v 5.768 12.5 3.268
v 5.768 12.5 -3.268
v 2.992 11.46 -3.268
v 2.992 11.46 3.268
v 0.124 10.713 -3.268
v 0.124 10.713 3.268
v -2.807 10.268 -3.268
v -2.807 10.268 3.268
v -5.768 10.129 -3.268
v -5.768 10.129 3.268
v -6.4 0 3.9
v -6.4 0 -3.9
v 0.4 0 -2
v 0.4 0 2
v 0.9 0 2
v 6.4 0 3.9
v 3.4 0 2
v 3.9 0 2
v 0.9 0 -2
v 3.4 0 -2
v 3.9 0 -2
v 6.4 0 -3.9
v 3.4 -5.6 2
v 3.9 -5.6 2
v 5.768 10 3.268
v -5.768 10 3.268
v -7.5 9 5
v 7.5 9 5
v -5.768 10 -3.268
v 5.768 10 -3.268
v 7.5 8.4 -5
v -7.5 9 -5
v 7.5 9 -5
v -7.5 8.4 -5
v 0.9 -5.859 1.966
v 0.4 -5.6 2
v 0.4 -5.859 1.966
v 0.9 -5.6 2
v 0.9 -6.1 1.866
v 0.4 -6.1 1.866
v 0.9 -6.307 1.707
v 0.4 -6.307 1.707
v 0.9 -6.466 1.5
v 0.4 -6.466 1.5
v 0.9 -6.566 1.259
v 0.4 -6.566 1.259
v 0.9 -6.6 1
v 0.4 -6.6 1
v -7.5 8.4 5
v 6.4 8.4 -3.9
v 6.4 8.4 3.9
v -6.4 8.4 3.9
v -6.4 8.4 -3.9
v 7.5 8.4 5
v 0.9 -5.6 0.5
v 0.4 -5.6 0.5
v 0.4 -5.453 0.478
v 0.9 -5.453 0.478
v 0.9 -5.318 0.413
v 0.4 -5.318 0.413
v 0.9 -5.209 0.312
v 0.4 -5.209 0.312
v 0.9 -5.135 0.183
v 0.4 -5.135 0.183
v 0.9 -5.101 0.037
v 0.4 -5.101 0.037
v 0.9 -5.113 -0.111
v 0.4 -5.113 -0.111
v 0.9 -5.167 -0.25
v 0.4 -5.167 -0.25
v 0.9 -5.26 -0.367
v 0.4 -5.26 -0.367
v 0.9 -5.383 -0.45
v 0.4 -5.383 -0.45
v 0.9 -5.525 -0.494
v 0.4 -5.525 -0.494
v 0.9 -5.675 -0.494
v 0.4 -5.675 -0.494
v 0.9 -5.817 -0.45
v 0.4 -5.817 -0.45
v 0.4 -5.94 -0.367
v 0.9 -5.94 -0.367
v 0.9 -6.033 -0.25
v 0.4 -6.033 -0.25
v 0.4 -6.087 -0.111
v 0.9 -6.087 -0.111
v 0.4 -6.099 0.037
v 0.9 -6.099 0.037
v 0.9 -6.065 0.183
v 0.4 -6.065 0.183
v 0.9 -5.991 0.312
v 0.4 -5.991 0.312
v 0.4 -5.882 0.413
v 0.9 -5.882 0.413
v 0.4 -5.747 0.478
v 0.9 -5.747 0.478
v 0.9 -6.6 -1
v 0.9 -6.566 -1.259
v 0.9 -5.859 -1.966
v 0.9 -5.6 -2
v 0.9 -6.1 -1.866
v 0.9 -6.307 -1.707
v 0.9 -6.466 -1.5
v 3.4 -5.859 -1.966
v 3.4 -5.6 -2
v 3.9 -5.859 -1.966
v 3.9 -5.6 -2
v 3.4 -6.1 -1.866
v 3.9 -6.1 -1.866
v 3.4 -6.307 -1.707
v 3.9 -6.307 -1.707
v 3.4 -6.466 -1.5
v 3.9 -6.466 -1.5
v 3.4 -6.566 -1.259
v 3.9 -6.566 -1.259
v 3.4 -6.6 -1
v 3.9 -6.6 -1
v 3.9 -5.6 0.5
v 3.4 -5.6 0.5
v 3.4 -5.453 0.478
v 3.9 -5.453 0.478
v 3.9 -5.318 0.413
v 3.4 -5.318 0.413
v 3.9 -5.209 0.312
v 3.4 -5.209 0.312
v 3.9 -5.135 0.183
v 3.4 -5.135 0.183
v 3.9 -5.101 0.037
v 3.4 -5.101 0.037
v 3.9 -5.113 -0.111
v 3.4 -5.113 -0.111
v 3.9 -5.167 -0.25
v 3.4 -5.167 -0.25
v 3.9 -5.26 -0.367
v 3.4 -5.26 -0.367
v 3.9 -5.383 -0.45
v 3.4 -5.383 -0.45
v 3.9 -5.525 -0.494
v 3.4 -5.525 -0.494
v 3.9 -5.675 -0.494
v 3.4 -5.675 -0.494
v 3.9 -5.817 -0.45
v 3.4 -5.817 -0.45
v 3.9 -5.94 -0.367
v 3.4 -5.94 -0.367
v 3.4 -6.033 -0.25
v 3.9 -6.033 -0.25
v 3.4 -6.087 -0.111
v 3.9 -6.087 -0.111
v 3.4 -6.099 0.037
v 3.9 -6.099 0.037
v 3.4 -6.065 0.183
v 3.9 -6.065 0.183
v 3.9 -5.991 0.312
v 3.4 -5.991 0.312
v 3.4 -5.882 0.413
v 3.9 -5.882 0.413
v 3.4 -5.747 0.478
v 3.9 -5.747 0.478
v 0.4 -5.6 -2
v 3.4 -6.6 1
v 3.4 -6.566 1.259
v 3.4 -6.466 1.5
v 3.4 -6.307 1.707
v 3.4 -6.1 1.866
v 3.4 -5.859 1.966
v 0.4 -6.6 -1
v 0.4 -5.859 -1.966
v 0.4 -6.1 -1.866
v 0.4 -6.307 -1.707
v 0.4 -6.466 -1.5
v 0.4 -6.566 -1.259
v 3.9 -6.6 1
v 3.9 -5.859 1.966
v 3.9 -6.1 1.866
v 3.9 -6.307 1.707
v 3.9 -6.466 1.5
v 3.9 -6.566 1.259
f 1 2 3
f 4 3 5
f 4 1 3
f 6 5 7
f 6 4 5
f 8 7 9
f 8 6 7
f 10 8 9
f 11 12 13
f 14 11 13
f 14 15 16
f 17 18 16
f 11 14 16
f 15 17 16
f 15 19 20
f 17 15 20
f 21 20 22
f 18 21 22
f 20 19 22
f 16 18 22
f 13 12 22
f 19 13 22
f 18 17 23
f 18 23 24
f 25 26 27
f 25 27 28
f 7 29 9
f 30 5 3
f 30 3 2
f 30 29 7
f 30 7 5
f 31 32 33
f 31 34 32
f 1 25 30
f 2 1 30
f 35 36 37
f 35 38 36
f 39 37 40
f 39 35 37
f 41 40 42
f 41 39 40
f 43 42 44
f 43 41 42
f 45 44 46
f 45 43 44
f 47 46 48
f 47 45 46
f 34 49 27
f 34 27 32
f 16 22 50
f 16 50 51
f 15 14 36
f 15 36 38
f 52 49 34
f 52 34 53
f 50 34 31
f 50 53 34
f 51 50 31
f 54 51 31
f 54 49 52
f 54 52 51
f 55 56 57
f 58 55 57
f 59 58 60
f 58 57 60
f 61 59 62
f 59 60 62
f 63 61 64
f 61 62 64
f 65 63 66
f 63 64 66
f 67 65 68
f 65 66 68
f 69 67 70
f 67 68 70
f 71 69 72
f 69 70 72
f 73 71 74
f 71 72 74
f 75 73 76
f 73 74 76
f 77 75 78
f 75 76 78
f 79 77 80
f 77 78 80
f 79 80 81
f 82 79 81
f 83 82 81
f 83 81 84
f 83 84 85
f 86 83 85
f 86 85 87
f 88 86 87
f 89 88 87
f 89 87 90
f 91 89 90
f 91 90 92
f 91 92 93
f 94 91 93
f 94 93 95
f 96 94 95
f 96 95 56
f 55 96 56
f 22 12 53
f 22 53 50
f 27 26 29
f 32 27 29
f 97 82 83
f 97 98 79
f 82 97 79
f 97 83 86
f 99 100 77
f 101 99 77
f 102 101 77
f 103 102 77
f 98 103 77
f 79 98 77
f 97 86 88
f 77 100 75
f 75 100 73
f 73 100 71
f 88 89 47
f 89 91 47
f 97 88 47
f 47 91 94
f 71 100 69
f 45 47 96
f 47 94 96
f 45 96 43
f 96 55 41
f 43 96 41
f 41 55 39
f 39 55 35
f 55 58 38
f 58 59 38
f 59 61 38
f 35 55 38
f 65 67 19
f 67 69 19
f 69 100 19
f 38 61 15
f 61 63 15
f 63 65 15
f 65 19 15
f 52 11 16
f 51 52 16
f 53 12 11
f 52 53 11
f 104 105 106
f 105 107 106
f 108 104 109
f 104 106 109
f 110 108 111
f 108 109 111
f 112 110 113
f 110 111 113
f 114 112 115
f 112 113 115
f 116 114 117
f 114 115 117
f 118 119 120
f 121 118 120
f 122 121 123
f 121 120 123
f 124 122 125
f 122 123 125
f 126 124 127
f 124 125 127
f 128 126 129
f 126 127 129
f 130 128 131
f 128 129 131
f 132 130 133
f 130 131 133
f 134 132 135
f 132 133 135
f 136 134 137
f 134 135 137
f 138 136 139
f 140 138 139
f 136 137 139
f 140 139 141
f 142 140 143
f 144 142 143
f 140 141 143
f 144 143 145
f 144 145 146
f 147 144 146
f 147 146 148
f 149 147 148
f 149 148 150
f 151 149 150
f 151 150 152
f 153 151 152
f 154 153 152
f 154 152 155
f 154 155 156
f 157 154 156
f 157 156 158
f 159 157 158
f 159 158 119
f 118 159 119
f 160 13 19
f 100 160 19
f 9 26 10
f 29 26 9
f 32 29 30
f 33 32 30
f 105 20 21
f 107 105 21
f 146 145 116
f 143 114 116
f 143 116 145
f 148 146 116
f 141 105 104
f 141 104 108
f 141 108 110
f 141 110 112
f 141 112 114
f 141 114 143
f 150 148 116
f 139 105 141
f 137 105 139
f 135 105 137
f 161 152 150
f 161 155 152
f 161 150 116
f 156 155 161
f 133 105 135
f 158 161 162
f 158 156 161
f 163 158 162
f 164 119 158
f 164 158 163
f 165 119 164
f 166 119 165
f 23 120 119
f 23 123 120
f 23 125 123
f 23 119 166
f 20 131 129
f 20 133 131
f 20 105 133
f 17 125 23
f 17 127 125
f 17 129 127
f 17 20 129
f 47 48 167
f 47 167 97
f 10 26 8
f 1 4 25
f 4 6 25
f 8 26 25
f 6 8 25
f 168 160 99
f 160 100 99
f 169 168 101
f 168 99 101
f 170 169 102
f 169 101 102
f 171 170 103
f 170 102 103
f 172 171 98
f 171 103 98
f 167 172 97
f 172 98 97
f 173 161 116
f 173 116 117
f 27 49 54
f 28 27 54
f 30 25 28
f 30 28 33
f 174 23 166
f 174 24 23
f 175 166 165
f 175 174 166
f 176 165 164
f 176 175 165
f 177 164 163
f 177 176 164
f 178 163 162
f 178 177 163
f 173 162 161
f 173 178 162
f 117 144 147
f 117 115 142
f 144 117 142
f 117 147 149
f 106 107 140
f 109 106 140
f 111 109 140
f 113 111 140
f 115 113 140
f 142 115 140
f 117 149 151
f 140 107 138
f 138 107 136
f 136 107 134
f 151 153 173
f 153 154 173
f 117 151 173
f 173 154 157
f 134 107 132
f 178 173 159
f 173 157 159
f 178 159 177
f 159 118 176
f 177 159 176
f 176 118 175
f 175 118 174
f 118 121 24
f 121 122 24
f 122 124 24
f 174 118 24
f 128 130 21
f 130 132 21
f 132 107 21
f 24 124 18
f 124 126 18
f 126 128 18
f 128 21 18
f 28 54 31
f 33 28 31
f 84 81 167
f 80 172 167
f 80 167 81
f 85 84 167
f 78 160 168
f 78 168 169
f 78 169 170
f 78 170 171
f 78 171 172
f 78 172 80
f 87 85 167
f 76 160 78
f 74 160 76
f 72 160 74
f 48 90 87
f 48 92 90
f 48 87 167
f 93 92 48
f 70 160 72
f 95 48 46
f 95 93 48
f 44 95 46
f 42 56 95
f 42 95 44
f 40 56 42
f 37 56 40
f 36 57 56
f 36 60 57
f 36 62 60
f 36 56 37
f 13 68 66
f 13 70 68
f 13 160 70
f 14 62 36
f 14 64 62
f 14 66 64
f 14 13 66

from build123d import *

# Parameters (mm, degrees)
SKETCH1_W               = 15
SKETCH1_H               = 10
BOSS_EXTRUDE1_DEPTH     = 10
SKETCH2_W               = 15
SKETCH2_H               = 10
SKETCH2_W_2             = 12.8
SKETCH2_H_2             = 7.8
CUT_EXTRUDE1_DEPTH      = 8.4
CHAMFER1_SIZE           = 1
CHAMFER1_SIZE2          = 1.732050808
CHAMFER1_PART_2_SIZE    = 1
CHAMFER1_PART_2_SIZE2   = 1.732050808
CHAMFER1_PART_3_SIZE    = 1
CHAMFER1_PART_3_SIZE2   = 1.732050808
CHAMFER1_PART_4_SIZE    = 1
CHAMFER1_PART_4_SIZE2   = 1.732050808
SKETCH3_W               = 0.5
SKETCH3_H               = 4
EXTRUDE_THIN1_DEPTH     = 6.6
FILLET1_R               = 1
SKETCH4_R               = 0.5
CUT_EXTRUDE2_DEPTH      = 6.6
SKETCH5_W               = 11.535898384
SKETCH5_H               = 6.535898384
BOSS_EXTRUDE2_DEPTH     = 2.5
CUT_EXTRUDE5_DEPTH      = 2.732050808
CUT_EXTRUDE5_DEPTH_BACK = 7.5


with BuildPart() as part:
    # Sketch1 → Boss-Extrude1 (new body)
    with BuildSketch(Plane(origin=(0, 0, 0), x_dir=(1, 0, 0), z_dir=(0, 1, 0))):
        Rectangle(SKETCH1_W, SKETCH1_H)
    extrude(amount=BOSS_EXTRUDE1_DEPTH)

    # Sketch2 → Cut-Extrude1 (cut)
    with BuildSketch(Plane.XZ):
        Rectangle(SKETCH2_W, SKETCH2_H)
        Rectangle(SKETCH2_W_2, SKETCH2_H_2, mode=Mode.SUBTRACT)
    extrude(amount=-CUT_EXTRUDE1_DEPTH, mode=Mode.SUBTRACT)

    # Chamfer1
    chamfer1_edges = [part.edges().sort_by_distance(p)[0] for p in [
        (-7.5, 10, 0),
    ]]
    chamfer1_side = [part.faces().sort_by_distance(p)[0] for p in [
        (-7.5, 9.2, 0),
    ]]
    chamfer(chamfer1_edges, length=CHAMFER1_SIZE, length2=CHAMFER1_SIZE2, reference=chamfer1_side[0])

    # Chamfer1 part 2
    chamfer1_part_2_edges = [part.edges().sort_by_distance(p)[0] for p in [
        (0, 10, 5),
    ]]
    chamfer1_part_2_side = [part.faces().sort_by_distance(p)[0] for p in [
        (0, 9.2, 5),
    ]]
    chamfer(chamfer1_part_2_edges, length=CHAMFER1_PART_2_SIZE, length2=CHAMFER1_PART_2_SIZE2, reference=chamfer1_part_2_side[0])

    # Chamfer1 part 3
    chamfer1_part_3_edges = [part.edges().sort_by_distance(p)[0] for p in [
        (7.5, 10, 0),
    ]]
    chamfer1_part_3_side = [part.faces().sort_by_distance(p)[0] for p in [
        (7.5, 9.2, 0),
    ]]
    chamfer(chamfer1_part_3_edges, length=CHAMFER1_PART_3_SIZE, length2=CHAMFER1_PART_3_SIZE2, reference=chamfer1_part_3_side[0])

    # Chamfer1 part 4
    chamfer1_part_4_edges = [part.edges().sort_by_distance(p)[0] for p in [
        (0, 10, -5),
    ]]
    chamfer1_part_4_side = [part.faces().sort_by_distance(p)[0] for p in [
        (0, 9.2, -5),
    ]]
    chamfer(chamfer1_part_4_edges, length=CHAMFER1_PART_4_SIZE, length2=CHAMFER1_PART_4_SIZE2, reference=chamfer1_part_4_side[0])

    # Sketch3 → Extrude-Thin1 (add)
    with BuildSketch(Plane.XZ):
        with Locations((3.65, 0)):
            Rectangle(SKETCH3_W, SKETCH3_H)
        with Locations((0.65, 0)):
            Rectangle(SKETCH3_W, SKETCH3_H)
    extrude(amount=EXTRUDE_THIN1_DEPTH)

    # Fillet1
    fillet1_edges = [part.edges().sort_by_distance(p)[0] for p in [
        (3.65, -6.6, 2),
        (3.65, -6.6, -2),
        (0.65, -6.6, 2),
        (0.65, -6.6, -2),
    ]]
    fillet(fillet1_edges, radius=FILLET1_R)

    # Sketch4 → Cut-Extrude2 (cut)
    with BuildSketch(Plane.ZY.offset(-0.4)):
        with Locations((0, -5.6)):
            Circle(SKETCH4_R)
    extrude(amount=-CUT_EXTRUDE2_DEPTH, mode=Mode.SUBTRACT)

    # Sketch5 → Boss-Extrude2 (add)
    with BuildSketch(Plane(origin=(0, 10, 0), x_dir=(1, 0, 0), z_dir=(0, 1, 0))):
        Rectangle(SKETCH5_W, SKETCH5_H)
    extrude(amount=BOSS_EXTRUDE2_DEPTH)

    # Sketch6 → Cut-Extrude5 (cut, two sides)
    with BuildSketch(Plane.XY.offset(3.267949192)) as cut_extrude5_sk:
        with BuildLine():
            Line((57.587759611, 35.04655449), (5.767949192, 12.5))
            ThreePointArc((5.767949192, 12.5), (0.123547764, 10.713329317), (-5.767949192, 10.128758351))
            Line((-5.767949192, 10.128758351), (-62.279560483, 10.40743474))
            Line((-62.279560483, 10.40743474), (-85.036348275, 121.117362453))
            Line((-85.036348275, 121.117362453), (34.83097182, 145.756482204))
            Line((34.83097182, 145.756482204), (57.587759611, 35.04655449))
        make_face()
    extrude(amount=CUT_EXTRUDE5_DEPTH, mode=Mode.SUBTRACT)
    extrude(cut_extrude5_sk.sketch, amount=-CUT_EXTRUDE5_DEPTH_BACK, mode=Mode.SUBTRACT)


solid = part.part
